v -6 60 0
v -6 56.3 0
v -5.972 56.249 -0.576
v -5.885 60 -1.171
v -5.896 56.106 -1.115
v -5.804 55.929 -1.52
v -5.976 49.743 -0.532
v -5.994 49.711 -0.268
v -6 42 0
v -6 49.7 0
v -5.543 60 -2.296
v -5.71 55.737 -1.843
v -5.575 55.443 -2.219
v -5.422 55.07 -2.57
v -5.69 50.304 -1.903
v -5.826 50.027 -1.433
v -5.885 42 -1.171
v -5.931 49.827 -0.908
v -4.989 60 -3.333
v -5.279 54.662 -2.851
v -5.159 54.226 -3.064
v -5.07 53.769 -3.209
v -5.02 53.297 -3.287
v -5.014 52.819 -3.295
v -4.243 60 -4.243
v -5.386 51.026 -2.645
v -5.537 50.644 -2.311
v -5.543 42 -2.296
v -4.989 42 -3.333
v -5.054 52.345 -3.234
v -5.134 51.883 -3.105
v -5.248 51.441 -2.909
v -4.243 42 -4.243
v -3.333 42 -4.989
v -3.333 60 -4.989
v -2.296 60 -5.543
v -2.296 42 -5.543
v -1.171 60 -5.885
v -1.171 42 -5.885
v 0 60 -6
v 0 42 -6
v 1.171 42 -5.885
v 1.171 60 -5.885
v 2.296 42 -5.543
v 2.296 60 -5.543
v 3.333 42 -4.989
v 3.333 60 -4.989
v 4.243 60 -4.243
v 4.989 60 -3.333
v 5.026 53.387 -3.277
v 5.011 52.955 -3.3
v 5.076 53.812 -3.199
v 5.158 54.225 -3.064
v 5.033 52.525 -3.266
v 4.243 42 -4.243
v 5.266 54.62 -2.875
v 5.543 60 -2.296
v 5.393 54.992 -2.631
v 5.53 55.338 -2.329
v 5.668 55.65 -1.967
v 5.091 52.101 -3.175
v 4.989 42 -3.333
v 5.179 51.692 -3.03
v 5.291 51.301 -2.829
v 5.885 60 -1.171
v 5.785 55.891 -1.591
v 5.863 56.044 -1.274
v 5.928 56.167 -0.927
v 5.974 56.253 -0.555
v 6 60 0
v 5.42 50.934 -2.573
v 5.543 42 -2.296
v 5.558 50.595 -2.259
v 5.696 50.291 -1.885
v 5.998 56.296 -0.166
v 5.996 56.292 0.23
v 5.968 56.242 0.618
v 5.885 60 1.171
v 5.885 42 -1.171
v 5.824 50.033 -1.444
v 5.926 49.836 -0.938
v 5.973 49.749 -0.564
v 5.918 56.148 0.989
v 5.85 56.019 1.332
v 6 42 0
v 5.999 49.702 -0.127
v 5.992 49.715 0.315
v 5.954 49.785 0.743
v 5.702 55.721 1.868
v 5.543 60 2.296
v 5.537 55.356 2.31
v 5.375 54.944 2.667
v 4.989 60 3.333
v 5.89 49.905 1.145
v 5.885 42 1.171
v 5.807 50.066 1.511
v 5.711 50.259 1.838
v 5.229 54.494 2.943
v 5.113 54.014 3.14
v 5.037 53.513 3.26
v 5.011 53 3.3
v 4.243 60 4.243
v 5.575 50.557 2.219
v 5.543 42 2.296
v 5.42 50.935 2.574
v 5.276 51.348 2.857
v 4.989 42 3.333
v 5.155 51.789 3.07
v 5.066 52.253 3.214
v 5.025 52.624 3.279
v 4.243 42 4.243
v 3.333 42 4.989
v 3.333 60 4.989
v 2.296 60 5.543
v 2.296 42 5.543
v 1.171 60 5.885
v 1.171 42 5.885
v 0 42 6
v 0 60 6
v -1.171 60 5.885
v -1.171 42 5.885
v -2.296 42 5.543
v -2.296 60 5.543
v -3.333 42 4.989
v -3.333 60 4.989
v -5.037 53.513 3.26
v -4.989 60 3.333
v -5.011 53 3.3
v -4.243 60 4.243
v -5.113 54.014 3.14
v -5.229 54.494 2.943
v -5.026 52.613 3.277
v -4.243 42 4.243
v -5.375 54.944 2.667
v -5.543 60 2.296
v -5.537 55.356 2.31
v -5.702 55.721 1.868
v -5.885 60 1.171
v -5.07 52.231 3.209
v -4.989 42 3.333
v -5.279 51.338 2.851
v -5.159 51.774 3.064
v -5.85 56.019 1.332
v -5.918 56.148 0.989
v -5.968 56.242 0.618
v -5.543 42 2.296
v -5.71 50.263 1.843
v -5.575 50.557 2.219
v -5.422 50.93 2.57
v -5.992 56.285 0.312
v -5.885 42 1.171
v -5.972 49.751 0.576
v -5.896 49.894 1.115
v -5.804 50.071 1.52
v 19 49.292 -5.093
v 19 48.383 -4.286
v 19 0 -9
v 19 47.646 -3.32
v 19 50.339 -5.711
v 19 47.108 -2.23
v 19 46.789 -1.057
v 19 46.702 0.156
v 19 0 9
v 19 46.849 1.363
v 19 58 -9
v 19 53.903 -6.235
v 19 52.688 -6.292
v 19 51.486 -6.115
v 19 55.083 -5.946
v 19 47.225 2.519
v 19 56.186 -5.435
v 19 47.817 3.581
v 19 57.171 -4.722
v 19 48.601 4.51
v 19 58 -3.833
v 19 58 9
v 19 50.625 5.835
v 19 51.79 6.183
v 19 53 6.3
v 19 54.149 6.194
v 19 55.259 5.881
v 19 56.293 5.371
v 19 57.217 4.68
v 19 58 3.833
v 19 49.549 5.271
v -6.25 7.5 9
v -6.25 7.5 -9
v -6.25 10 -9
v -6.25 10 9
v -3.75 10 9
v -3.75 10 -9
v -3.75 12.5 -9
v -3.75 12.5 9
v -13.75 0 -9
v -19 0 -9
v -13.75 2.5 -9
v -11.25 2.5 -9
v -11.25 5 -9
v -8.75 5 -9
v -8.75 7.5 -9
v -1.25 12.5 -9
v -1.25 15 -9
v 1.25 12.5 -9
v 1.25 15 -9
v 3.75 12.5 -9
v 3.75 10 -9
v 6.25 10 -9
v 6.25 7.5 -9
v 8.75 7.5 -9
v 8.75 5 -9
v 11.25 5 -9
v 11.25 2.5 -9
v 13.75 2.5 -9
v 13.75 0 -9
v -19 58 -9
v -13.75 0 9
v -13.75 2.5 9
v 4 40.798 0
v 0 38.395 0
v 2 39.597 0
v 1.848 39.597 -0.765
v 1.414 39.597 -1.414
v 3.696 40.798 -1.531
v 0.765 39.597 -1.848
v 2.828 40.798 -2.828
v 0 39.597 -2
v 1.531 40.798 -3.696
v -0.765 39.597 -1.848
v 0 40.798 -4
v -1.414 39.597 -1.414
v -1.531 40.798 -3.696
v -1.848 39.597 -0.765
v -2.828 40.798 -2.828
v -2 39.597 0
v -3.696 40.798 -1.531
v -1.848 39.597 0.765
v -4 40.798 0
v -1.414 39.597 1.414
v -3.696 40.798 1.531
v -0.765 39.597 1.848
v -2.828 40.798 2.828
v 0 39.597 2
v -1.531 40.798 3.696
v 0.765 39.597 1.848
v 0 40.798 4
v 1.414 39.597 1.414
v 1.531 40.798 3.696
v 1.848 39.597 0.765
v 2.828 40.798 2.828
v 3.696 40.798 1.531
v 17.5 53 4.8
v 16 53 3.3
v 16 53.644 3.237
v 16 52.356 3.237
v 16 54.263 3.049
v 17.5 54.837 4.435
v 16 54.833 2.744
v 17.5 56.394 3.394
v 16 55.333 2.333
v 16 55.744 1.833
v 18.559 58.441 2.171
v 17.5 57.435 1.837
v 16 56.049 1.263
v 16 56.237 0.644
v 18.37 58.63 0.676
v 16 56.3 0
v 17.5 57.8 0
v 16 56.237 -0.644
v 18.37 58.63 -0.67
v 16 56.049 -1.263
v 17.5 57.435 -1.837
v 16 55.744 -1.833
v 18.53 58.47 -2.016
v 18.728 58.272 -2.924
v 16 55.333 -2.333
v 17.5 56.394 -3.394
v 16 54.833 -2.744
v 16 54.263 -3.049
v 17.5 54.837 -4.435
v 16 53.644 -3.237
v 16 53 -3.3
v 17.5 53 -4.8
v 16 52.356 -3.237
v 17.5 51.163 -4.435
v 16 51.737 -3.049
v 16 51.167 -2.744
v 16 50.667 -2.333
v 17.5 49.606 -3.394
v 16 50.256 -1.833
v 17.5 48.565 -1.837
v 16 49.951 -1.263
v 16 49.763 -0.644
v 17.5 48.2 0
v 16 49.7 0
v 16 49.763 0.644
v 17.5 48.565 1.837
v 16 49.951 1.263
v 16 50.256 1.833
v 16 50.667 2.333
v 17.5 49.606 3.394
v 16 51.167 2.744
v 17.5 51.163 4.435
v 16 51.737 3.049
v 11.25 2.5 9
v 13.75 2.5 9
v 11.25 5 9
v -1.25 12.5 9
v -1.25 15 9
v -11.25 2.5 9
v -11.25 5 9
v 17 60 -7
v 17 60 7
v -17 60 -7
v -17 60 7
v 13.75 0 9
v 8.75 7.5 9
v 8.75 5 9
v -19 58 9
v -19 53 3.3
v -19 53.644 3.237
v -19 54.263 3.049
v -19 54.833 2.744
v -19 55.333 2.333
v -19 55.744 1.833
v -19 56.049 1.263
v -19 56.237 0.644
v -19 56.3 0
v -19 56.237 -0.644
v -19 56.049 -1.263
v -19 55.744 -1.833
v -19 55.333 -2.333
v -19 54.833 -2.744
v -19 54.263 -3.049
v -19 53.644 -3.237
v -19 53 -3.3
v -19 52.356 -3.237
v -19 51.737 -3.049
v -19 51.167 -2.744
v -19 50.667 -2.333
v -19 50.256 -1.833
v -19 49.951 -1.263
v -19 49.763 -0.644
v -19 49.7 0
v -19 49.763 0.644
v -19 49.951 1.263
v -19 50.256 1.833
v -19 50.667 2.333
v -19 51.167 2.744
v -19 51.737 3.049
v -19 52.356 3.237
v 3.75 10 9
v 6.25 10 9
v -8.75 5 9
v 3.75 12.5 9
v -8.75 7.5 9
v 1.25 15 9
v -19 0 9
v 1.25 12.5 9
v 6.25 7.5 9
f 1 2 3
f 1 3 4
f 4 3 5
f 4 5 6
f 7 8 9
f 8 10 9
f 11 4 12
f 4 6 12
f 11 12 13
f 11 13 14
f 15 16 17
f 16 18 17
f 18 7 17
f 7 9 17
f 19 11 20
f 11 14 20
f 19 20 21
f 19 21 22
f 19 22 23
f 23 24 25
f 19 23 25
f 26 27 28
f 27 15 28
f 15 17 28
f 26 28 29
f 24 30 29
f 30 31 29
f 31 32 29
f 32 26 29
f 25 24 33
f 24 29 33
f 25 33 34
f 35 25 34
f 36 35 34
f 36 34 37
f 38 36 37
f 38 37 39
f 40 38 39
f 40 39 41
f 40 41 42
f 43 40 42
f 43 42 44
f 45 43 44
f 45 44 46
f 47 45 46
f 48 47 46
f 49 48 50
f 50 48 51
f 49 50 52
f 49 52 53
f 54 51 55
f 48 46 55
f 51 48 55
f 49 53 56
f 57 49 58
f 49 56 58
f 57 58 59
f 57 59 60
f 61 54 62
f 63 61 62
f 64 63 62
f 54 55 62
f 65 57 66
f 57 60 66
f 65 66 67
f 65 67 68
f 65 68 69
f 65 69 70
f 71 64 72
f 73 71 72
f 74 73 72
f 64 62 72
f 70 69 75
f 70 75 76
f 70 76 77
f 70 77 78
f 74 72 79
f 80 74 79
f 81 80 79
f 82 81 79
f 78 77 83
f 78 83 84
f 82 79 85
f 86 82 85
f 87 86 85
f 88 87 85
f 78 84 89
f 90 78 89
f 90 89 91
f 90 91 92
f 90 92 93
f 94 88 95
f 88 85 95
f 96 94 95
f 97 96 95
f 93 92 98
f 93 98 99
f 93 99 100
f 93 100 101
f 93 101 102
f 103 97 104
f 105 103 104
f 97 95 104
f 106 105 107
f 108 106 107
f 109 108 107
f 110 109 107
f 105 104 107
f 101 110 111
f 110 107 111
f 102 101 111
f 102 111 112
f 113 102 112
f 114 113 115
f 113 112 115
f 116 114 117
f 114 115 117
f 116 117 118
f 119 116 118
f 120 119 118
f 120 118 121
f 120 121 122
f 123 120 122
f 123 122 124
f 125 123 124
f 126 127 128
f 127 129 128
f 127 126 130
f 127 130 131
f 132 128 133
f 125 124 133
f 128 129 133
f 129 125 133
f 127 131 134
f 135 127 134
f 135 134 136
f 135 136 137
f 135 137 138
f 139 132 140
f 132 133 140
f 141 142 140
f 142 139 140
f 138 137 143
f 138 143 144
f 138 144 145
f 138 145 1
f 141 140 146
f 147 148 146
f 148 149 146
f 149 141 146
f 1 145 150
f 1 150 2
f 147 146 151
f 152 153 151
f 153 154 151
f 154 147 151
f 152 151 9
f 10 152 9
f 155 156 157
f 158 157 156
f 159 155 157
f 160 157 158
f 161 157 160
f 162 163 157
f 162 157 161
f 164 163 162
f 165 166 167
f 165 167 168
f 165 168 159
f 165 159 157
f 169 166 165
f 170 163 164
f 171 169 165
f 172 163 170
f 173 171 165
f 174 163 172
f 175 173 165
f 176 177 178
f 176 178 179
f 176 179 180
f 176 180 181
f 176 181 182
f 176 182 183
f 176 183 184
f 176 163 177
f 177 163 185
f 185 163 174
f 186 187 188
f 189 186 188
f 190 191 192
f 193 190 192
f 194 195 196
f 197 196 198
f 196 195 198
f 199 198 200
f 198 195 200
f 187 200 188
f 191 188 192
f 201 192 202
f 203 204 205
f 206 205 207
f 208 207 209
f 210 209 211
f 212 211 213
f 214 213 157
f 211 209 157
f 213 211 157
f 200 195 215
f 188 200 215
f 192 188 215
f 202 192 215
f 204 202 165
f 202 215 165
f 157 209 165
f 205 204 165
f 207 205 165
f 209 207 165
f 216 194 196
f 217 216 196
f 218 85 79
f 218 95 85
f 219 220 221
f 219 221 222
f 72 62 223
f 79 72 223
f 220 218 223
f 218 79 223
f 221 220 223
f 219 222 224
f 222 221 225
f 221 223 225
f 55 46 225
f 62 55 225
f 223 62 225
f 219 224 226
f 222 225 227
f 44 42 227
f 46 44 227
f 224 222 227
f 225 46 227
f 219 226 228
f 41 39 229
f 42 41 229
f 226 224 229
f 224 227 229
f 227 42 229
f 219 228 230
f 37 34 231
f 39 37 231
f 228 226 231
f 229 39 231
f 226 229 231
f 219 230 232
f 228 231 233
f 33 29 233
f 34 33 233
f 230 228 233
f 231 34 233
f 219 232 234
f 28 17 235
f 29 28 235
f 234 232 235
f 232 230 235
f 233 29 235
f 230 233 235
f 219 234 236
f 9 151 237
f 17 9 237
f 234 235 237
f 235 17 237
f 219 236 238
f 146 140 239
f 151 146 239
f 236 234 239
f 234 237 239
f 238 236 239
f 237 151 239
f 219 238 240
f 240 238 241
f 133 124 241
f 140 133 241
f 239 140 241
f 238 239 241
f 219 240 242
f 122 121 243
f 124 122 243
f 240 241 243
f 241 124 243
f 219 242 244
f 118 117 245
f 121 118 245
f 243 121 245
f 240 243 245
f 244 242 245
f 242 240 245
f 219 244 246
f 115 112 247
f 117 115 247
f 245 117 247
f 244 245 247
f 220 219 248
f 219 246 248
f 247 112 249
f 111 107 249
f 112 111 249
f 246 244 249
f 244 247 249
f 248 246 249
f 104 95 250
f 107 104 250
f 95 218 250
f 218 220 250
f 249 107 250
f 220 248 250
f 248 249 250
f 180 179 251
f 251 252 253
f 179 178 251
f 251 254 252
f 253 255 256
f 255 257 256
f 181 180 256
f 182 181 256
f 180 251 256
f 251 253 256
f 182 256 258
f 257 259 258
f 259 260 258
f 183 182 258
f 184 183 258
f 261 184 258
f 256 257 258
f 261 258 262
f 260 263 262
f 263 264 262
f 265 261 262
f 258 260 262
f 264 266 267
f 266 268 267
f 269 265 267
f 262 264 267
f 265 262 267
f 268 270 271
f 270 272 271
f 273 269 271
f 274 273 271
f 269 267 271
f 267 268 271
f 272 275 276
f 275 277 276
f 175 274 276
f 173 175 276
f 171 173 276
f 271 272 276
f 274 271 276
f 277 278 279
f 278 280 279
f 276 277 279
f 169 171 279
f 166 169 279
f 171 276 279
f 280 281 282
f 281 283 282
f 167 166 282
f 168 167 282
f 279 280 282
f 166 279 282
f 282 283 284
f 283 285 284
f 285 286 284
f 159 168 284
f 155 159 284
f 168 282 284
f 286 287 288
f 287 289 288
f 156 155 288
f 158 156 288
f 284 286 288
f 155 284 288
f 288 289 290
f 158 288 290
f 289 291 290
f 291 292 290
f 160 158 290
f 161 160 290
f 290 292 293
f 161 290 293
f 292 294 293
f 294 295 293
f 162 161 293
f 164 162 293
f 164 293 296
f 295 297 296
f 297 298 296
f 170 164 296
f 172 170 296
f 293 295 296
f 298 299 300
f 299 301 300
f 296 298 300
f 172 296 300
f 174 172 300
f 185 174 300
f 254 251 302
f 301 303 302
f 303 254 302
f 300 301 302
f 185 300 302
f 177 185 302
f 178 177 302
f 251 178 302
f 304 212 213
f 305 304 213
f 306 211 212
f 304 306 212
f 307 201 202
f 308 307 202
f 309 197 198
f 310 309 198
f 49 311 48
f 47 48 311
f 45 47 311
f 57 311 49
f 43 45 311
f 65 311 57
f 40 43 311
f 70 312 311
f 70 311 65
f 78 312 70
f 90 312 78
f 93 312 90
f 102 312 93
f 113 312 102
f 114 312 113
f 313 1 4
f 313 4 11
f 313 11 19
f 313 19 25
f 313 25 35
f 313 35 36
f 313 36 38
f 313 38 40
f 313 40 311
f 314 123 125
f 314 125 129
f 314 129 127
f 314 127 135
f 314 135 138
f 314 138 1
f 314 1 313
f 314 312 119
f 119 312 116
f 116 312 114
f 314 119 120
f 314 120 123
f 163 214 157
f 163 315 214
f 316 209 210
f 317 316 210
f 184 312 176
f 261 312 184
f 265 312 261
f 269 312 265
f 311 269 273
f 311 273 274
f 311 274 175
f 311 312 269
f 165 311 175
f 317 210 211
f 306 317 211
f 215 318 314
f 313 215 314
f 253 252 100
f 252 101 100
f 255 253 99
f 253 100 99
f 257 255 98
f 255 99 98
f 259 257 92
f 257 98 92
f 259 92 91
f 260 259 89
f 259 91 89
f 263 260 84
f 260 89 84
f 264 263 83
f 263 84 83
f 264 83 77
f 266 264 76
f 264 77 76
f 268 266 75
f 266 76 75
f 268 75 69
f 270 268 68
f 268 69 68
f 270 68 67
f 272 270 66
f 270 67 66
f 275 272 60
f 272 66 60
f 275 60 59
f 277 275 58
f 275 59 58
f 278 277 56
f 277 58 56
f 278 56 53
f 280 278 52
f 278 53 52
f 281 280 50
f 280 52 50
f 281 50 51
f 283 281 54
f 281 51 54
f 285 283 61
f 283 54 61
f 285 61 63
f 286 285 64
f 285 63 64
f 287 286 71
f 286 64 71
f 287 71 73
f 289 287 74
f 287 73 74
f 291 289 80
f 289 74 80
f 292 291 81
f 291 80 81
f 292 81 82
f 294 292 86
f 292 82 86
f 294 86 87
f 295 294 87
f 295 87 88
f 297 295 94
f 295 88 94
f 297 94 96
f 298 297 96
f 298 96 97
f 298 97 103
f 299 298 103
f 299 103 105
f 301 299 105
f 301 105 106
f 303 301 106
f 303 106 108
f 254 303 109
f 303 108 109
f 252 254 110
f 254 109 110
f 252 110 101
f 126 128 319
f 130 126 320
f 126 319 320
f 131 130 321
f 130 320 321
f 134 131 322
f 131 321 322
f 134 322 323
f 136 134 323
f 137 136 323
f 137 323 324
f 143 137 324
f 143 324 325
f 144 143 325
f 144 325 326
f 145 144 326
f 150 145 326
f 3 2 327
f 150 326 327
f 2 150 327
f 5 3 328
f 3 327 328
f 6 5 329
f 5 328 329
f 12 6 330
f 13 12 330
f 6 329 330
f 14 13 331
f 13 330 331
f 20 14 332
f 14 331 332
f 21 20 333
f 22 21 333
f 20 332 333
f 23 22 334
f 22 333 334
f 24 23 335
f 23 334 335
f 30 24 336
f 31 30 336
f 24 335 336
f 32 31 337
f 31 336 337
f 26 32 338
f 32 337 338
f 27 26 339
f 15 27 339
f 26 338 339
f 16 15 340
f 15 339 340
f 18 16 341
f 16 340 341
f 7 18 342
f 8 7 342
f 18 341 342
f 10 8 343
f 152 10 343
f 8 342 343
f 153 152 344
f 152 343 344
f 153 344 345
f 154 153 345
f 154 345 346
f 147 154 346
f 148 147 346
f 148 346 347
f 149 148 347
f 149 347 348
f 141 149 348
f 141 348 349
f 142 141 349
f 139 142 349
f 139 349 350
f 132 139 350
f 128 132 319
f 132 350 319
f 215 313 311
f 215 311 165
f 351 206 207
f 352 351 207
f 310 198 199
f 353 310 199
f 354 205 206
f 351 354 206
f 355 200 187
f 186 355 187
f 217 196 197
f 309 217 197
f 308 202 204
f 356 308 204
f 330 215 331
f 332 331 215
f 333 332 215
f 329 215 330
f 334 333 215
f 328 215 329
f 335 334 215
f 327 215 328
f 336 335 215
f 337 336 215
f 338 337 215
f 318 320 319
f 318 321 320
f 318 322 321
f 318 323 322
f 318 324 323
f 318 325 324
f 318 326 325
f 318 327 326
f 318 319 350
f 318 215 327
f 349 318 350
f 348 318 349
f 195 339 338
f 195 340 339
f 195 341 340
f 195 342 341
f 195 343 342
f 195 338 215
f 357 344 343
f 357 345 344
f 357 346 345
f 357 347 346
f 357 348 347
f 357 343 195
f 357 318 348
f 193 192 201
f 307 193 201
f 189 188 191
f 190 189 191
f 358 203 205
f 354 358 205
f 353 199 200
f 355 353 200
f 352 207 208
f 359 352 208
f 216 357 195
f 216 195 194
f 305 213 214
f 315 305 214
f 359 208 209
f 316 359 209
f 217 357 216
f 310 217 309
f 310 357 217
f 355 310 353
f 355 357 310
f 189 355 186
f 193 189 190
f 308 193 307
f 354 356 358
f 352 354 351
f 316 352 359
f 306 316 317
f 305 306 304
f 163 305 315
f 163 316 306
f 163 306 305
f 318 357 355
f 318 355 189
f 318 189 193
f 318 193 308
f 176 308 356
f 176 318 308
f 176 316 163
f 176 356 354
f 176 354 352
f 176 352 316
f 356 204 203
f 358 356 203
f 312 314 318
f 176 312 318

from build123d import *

# Parameters (mm, degrees)
BOSS_EXTRUDE1_DEPTH                             = 9
F_12_0MM_DOWEL_HOLE1_D                          = 12
F_12_0MM_DOWEL_HOLE1_DEPTH                      = 18
F_12_0MM_DOWEL_HOLE1_TIP                        = 3.605163714
CSK_FOR_M6_FLAT_HEAD_MACHINE_SCREW2_D           = 6.6
CSK_FOR_M6_FLAT_HEAD_MACHINE_SCREW2_DEPTH       = 38
CSK_FOR_M6_FLAT_HEAD_MACHINE_SCREW2_CSINK_D     = 12.6
CSK_FOR_M6_FLAT_HEAD_MACHINE_SCREW2_CSINK_ANGLE = 90
CSK_FOR_M6_FLAT_HEAD_MACHINE_SCREW2_TIP         = 1.982840043
CHAMFER1_SIZE                                   = 2


with BuildPart() as part:
    # Sketch1 → Boss-Extrude1 (new, symmetric)
    with BuildSketch(Plane.XY):
        Polygon((19, 60), (-19, 60), (-19, 0), (-13.75, 0), (-13.75, 2.5), (-11.25, 2.5), (-11.25, 5), (-8.75, 5), (-8.75, 7.5), (-6.25, 7.5), (-6.25, 10), (-3.75, 10), (-3.75, 12.5), (-1.25, 12.5), (-1.25, 15), (1.25, 15), (1.25, 12.5), (3.75, 12.5), (3.75, 10), (6.25, 10), (6.25, 7.5), (8.75, 7.5), (8.75, 5), (11.25, 5), (11.25, 2.5), (13.75, 2.5), (13.75, 0), (19, 0), align=None)
    extrude(amount=BOSS_EXTRUDE1_DEPTH, both=True)

    # Ø12.0mm Dowel Hole1
    with Locations(Plane(origin=(0, 60, 0), x_dir=(1, 0, 0), z_dir=(0, 1, 0))):
        with Locations((0, 0)):
            Hole(F_12_0MM_DOWEL_HOLE1_D / 2, depth=F_12_0MM_DOWEL_HOLE1_DEPTH)
            with Locations((0, 0, -(F_12_0MM_DOWEL_HOLE1_DEPTH + F_12_0MM_DOWEL_HOLE1_TIP / 2))):  # 118° drill point
                Cone(0, F_12_0MM_DOWEL_HOLE1_D / 2, F_12_0MM_DOWEL_HOLE1_TIP, mode=Mode.SUBTRACT)

    # CSK for M6 Flat Head Machine Screw2
    with Locations(Plane(origin=(19, 0, 0), x_dir=(0, 0, -1), z_dir=(1, 0, 0))):
        with Locations((0, 53)):
            CounterSinkHole(CSK_FOR_M6_FLAT_HEAD_MACHINE_SCREW2_D / 2, CSK_FOR_M6_FLAT_HEAD_MACHINE_SCREW2_CSINK_D / 2, depth=CSK_FOR_M6_FLAT_HEAD_MACHINE_SCREW2_DEPTH, counter_sink_angle=CSK_FOR_M6_FLAT_HEAD_MACHINE_SCREW2_CSINK_ANGLE)
            with Locations((0, 0, -(CSK_FOR_M6_FLAT_HEAD_MACHINE_SCREW2_DEPTH + CSK_FOR_M6_FLAT_HEAD_MACHINE_SCREW2_TIP / 2))):  # 118° drill point
                Cone(0, CSK_FOR_M6_FLAT_HEAD_MACHINE_SCREW2_D / 2, CSK_FOR_M6_FLAT_HEAD_MACHINE_SCREW2_TIP, mode=Mode.SUBTRACT)

    # Chamfer1
    # the kernel refuses this chamfer: 2 mm, written as the material it takes off along each edge
    with BuildSketch(Plane(origin=(24.143365976, 60, -9), x_dir=(0, 0.027495876610585623, 0.9996219169112968), z_dir=(-1, 0, 0))) as chamfer1_piece_1:
        Polygon((CHAMFER1_SIZE * 0.999621916911, -CHAMFER1_SIZE * 0.0274958766106), (-CHAMFER1_SIZE * 0.0274958766106, -CHAMFER1_SIZE * 0.999621916911), (0, 0), align=None)
    extrude(amount=48.286731952, mode=Mode.SUBTRACT)
    with BuildSketch(Plane(origin=(-19, 60, -14.143365976), x_dir=(-0.027495876610585647, -0.9996219169112968, 0), z_dir=(0, 0, 1)), Plane(origin=(19, 60, -14.143365976), x_dir=(-0.9996219169112968, 0.027495876610585647, 0), z_dir=(0, 0, 1))) as chamfer1_piece_2:
        Polygon((CHAMFER1_SIZE * 0.999621916911, CHAMFER1_SIZE * 0.0274958766106), (-CHAMFER1_SIZE * 0.0274958766106, CHAMFER1_SIZE * 0.999621916911), (0, 0), align=None)
    extrude(amount=28.286731952, mode=Mode.SUBTRACT)
    with BuildSketch(Plane(origin=(24.143365976, 60, 9), x_dir=(0, 0.027495876610585623, -0.9996219169112968), z_dir=(-1, 0, 0))) as chamfer1_piece_3:
        Polygon((CHAMFER1_SIZE * 0.999621916911, CHAMFER1_SIZE * 0.0274958766106), (-CHAMFER1_SIZE * 0.0274958766106, CHAMFER1_SIZE * 0.999621916911), (0, 0), align=None)
    extrude(amount=48.286731952, mode=Mode.SUBTRACT)


solid = part.part
